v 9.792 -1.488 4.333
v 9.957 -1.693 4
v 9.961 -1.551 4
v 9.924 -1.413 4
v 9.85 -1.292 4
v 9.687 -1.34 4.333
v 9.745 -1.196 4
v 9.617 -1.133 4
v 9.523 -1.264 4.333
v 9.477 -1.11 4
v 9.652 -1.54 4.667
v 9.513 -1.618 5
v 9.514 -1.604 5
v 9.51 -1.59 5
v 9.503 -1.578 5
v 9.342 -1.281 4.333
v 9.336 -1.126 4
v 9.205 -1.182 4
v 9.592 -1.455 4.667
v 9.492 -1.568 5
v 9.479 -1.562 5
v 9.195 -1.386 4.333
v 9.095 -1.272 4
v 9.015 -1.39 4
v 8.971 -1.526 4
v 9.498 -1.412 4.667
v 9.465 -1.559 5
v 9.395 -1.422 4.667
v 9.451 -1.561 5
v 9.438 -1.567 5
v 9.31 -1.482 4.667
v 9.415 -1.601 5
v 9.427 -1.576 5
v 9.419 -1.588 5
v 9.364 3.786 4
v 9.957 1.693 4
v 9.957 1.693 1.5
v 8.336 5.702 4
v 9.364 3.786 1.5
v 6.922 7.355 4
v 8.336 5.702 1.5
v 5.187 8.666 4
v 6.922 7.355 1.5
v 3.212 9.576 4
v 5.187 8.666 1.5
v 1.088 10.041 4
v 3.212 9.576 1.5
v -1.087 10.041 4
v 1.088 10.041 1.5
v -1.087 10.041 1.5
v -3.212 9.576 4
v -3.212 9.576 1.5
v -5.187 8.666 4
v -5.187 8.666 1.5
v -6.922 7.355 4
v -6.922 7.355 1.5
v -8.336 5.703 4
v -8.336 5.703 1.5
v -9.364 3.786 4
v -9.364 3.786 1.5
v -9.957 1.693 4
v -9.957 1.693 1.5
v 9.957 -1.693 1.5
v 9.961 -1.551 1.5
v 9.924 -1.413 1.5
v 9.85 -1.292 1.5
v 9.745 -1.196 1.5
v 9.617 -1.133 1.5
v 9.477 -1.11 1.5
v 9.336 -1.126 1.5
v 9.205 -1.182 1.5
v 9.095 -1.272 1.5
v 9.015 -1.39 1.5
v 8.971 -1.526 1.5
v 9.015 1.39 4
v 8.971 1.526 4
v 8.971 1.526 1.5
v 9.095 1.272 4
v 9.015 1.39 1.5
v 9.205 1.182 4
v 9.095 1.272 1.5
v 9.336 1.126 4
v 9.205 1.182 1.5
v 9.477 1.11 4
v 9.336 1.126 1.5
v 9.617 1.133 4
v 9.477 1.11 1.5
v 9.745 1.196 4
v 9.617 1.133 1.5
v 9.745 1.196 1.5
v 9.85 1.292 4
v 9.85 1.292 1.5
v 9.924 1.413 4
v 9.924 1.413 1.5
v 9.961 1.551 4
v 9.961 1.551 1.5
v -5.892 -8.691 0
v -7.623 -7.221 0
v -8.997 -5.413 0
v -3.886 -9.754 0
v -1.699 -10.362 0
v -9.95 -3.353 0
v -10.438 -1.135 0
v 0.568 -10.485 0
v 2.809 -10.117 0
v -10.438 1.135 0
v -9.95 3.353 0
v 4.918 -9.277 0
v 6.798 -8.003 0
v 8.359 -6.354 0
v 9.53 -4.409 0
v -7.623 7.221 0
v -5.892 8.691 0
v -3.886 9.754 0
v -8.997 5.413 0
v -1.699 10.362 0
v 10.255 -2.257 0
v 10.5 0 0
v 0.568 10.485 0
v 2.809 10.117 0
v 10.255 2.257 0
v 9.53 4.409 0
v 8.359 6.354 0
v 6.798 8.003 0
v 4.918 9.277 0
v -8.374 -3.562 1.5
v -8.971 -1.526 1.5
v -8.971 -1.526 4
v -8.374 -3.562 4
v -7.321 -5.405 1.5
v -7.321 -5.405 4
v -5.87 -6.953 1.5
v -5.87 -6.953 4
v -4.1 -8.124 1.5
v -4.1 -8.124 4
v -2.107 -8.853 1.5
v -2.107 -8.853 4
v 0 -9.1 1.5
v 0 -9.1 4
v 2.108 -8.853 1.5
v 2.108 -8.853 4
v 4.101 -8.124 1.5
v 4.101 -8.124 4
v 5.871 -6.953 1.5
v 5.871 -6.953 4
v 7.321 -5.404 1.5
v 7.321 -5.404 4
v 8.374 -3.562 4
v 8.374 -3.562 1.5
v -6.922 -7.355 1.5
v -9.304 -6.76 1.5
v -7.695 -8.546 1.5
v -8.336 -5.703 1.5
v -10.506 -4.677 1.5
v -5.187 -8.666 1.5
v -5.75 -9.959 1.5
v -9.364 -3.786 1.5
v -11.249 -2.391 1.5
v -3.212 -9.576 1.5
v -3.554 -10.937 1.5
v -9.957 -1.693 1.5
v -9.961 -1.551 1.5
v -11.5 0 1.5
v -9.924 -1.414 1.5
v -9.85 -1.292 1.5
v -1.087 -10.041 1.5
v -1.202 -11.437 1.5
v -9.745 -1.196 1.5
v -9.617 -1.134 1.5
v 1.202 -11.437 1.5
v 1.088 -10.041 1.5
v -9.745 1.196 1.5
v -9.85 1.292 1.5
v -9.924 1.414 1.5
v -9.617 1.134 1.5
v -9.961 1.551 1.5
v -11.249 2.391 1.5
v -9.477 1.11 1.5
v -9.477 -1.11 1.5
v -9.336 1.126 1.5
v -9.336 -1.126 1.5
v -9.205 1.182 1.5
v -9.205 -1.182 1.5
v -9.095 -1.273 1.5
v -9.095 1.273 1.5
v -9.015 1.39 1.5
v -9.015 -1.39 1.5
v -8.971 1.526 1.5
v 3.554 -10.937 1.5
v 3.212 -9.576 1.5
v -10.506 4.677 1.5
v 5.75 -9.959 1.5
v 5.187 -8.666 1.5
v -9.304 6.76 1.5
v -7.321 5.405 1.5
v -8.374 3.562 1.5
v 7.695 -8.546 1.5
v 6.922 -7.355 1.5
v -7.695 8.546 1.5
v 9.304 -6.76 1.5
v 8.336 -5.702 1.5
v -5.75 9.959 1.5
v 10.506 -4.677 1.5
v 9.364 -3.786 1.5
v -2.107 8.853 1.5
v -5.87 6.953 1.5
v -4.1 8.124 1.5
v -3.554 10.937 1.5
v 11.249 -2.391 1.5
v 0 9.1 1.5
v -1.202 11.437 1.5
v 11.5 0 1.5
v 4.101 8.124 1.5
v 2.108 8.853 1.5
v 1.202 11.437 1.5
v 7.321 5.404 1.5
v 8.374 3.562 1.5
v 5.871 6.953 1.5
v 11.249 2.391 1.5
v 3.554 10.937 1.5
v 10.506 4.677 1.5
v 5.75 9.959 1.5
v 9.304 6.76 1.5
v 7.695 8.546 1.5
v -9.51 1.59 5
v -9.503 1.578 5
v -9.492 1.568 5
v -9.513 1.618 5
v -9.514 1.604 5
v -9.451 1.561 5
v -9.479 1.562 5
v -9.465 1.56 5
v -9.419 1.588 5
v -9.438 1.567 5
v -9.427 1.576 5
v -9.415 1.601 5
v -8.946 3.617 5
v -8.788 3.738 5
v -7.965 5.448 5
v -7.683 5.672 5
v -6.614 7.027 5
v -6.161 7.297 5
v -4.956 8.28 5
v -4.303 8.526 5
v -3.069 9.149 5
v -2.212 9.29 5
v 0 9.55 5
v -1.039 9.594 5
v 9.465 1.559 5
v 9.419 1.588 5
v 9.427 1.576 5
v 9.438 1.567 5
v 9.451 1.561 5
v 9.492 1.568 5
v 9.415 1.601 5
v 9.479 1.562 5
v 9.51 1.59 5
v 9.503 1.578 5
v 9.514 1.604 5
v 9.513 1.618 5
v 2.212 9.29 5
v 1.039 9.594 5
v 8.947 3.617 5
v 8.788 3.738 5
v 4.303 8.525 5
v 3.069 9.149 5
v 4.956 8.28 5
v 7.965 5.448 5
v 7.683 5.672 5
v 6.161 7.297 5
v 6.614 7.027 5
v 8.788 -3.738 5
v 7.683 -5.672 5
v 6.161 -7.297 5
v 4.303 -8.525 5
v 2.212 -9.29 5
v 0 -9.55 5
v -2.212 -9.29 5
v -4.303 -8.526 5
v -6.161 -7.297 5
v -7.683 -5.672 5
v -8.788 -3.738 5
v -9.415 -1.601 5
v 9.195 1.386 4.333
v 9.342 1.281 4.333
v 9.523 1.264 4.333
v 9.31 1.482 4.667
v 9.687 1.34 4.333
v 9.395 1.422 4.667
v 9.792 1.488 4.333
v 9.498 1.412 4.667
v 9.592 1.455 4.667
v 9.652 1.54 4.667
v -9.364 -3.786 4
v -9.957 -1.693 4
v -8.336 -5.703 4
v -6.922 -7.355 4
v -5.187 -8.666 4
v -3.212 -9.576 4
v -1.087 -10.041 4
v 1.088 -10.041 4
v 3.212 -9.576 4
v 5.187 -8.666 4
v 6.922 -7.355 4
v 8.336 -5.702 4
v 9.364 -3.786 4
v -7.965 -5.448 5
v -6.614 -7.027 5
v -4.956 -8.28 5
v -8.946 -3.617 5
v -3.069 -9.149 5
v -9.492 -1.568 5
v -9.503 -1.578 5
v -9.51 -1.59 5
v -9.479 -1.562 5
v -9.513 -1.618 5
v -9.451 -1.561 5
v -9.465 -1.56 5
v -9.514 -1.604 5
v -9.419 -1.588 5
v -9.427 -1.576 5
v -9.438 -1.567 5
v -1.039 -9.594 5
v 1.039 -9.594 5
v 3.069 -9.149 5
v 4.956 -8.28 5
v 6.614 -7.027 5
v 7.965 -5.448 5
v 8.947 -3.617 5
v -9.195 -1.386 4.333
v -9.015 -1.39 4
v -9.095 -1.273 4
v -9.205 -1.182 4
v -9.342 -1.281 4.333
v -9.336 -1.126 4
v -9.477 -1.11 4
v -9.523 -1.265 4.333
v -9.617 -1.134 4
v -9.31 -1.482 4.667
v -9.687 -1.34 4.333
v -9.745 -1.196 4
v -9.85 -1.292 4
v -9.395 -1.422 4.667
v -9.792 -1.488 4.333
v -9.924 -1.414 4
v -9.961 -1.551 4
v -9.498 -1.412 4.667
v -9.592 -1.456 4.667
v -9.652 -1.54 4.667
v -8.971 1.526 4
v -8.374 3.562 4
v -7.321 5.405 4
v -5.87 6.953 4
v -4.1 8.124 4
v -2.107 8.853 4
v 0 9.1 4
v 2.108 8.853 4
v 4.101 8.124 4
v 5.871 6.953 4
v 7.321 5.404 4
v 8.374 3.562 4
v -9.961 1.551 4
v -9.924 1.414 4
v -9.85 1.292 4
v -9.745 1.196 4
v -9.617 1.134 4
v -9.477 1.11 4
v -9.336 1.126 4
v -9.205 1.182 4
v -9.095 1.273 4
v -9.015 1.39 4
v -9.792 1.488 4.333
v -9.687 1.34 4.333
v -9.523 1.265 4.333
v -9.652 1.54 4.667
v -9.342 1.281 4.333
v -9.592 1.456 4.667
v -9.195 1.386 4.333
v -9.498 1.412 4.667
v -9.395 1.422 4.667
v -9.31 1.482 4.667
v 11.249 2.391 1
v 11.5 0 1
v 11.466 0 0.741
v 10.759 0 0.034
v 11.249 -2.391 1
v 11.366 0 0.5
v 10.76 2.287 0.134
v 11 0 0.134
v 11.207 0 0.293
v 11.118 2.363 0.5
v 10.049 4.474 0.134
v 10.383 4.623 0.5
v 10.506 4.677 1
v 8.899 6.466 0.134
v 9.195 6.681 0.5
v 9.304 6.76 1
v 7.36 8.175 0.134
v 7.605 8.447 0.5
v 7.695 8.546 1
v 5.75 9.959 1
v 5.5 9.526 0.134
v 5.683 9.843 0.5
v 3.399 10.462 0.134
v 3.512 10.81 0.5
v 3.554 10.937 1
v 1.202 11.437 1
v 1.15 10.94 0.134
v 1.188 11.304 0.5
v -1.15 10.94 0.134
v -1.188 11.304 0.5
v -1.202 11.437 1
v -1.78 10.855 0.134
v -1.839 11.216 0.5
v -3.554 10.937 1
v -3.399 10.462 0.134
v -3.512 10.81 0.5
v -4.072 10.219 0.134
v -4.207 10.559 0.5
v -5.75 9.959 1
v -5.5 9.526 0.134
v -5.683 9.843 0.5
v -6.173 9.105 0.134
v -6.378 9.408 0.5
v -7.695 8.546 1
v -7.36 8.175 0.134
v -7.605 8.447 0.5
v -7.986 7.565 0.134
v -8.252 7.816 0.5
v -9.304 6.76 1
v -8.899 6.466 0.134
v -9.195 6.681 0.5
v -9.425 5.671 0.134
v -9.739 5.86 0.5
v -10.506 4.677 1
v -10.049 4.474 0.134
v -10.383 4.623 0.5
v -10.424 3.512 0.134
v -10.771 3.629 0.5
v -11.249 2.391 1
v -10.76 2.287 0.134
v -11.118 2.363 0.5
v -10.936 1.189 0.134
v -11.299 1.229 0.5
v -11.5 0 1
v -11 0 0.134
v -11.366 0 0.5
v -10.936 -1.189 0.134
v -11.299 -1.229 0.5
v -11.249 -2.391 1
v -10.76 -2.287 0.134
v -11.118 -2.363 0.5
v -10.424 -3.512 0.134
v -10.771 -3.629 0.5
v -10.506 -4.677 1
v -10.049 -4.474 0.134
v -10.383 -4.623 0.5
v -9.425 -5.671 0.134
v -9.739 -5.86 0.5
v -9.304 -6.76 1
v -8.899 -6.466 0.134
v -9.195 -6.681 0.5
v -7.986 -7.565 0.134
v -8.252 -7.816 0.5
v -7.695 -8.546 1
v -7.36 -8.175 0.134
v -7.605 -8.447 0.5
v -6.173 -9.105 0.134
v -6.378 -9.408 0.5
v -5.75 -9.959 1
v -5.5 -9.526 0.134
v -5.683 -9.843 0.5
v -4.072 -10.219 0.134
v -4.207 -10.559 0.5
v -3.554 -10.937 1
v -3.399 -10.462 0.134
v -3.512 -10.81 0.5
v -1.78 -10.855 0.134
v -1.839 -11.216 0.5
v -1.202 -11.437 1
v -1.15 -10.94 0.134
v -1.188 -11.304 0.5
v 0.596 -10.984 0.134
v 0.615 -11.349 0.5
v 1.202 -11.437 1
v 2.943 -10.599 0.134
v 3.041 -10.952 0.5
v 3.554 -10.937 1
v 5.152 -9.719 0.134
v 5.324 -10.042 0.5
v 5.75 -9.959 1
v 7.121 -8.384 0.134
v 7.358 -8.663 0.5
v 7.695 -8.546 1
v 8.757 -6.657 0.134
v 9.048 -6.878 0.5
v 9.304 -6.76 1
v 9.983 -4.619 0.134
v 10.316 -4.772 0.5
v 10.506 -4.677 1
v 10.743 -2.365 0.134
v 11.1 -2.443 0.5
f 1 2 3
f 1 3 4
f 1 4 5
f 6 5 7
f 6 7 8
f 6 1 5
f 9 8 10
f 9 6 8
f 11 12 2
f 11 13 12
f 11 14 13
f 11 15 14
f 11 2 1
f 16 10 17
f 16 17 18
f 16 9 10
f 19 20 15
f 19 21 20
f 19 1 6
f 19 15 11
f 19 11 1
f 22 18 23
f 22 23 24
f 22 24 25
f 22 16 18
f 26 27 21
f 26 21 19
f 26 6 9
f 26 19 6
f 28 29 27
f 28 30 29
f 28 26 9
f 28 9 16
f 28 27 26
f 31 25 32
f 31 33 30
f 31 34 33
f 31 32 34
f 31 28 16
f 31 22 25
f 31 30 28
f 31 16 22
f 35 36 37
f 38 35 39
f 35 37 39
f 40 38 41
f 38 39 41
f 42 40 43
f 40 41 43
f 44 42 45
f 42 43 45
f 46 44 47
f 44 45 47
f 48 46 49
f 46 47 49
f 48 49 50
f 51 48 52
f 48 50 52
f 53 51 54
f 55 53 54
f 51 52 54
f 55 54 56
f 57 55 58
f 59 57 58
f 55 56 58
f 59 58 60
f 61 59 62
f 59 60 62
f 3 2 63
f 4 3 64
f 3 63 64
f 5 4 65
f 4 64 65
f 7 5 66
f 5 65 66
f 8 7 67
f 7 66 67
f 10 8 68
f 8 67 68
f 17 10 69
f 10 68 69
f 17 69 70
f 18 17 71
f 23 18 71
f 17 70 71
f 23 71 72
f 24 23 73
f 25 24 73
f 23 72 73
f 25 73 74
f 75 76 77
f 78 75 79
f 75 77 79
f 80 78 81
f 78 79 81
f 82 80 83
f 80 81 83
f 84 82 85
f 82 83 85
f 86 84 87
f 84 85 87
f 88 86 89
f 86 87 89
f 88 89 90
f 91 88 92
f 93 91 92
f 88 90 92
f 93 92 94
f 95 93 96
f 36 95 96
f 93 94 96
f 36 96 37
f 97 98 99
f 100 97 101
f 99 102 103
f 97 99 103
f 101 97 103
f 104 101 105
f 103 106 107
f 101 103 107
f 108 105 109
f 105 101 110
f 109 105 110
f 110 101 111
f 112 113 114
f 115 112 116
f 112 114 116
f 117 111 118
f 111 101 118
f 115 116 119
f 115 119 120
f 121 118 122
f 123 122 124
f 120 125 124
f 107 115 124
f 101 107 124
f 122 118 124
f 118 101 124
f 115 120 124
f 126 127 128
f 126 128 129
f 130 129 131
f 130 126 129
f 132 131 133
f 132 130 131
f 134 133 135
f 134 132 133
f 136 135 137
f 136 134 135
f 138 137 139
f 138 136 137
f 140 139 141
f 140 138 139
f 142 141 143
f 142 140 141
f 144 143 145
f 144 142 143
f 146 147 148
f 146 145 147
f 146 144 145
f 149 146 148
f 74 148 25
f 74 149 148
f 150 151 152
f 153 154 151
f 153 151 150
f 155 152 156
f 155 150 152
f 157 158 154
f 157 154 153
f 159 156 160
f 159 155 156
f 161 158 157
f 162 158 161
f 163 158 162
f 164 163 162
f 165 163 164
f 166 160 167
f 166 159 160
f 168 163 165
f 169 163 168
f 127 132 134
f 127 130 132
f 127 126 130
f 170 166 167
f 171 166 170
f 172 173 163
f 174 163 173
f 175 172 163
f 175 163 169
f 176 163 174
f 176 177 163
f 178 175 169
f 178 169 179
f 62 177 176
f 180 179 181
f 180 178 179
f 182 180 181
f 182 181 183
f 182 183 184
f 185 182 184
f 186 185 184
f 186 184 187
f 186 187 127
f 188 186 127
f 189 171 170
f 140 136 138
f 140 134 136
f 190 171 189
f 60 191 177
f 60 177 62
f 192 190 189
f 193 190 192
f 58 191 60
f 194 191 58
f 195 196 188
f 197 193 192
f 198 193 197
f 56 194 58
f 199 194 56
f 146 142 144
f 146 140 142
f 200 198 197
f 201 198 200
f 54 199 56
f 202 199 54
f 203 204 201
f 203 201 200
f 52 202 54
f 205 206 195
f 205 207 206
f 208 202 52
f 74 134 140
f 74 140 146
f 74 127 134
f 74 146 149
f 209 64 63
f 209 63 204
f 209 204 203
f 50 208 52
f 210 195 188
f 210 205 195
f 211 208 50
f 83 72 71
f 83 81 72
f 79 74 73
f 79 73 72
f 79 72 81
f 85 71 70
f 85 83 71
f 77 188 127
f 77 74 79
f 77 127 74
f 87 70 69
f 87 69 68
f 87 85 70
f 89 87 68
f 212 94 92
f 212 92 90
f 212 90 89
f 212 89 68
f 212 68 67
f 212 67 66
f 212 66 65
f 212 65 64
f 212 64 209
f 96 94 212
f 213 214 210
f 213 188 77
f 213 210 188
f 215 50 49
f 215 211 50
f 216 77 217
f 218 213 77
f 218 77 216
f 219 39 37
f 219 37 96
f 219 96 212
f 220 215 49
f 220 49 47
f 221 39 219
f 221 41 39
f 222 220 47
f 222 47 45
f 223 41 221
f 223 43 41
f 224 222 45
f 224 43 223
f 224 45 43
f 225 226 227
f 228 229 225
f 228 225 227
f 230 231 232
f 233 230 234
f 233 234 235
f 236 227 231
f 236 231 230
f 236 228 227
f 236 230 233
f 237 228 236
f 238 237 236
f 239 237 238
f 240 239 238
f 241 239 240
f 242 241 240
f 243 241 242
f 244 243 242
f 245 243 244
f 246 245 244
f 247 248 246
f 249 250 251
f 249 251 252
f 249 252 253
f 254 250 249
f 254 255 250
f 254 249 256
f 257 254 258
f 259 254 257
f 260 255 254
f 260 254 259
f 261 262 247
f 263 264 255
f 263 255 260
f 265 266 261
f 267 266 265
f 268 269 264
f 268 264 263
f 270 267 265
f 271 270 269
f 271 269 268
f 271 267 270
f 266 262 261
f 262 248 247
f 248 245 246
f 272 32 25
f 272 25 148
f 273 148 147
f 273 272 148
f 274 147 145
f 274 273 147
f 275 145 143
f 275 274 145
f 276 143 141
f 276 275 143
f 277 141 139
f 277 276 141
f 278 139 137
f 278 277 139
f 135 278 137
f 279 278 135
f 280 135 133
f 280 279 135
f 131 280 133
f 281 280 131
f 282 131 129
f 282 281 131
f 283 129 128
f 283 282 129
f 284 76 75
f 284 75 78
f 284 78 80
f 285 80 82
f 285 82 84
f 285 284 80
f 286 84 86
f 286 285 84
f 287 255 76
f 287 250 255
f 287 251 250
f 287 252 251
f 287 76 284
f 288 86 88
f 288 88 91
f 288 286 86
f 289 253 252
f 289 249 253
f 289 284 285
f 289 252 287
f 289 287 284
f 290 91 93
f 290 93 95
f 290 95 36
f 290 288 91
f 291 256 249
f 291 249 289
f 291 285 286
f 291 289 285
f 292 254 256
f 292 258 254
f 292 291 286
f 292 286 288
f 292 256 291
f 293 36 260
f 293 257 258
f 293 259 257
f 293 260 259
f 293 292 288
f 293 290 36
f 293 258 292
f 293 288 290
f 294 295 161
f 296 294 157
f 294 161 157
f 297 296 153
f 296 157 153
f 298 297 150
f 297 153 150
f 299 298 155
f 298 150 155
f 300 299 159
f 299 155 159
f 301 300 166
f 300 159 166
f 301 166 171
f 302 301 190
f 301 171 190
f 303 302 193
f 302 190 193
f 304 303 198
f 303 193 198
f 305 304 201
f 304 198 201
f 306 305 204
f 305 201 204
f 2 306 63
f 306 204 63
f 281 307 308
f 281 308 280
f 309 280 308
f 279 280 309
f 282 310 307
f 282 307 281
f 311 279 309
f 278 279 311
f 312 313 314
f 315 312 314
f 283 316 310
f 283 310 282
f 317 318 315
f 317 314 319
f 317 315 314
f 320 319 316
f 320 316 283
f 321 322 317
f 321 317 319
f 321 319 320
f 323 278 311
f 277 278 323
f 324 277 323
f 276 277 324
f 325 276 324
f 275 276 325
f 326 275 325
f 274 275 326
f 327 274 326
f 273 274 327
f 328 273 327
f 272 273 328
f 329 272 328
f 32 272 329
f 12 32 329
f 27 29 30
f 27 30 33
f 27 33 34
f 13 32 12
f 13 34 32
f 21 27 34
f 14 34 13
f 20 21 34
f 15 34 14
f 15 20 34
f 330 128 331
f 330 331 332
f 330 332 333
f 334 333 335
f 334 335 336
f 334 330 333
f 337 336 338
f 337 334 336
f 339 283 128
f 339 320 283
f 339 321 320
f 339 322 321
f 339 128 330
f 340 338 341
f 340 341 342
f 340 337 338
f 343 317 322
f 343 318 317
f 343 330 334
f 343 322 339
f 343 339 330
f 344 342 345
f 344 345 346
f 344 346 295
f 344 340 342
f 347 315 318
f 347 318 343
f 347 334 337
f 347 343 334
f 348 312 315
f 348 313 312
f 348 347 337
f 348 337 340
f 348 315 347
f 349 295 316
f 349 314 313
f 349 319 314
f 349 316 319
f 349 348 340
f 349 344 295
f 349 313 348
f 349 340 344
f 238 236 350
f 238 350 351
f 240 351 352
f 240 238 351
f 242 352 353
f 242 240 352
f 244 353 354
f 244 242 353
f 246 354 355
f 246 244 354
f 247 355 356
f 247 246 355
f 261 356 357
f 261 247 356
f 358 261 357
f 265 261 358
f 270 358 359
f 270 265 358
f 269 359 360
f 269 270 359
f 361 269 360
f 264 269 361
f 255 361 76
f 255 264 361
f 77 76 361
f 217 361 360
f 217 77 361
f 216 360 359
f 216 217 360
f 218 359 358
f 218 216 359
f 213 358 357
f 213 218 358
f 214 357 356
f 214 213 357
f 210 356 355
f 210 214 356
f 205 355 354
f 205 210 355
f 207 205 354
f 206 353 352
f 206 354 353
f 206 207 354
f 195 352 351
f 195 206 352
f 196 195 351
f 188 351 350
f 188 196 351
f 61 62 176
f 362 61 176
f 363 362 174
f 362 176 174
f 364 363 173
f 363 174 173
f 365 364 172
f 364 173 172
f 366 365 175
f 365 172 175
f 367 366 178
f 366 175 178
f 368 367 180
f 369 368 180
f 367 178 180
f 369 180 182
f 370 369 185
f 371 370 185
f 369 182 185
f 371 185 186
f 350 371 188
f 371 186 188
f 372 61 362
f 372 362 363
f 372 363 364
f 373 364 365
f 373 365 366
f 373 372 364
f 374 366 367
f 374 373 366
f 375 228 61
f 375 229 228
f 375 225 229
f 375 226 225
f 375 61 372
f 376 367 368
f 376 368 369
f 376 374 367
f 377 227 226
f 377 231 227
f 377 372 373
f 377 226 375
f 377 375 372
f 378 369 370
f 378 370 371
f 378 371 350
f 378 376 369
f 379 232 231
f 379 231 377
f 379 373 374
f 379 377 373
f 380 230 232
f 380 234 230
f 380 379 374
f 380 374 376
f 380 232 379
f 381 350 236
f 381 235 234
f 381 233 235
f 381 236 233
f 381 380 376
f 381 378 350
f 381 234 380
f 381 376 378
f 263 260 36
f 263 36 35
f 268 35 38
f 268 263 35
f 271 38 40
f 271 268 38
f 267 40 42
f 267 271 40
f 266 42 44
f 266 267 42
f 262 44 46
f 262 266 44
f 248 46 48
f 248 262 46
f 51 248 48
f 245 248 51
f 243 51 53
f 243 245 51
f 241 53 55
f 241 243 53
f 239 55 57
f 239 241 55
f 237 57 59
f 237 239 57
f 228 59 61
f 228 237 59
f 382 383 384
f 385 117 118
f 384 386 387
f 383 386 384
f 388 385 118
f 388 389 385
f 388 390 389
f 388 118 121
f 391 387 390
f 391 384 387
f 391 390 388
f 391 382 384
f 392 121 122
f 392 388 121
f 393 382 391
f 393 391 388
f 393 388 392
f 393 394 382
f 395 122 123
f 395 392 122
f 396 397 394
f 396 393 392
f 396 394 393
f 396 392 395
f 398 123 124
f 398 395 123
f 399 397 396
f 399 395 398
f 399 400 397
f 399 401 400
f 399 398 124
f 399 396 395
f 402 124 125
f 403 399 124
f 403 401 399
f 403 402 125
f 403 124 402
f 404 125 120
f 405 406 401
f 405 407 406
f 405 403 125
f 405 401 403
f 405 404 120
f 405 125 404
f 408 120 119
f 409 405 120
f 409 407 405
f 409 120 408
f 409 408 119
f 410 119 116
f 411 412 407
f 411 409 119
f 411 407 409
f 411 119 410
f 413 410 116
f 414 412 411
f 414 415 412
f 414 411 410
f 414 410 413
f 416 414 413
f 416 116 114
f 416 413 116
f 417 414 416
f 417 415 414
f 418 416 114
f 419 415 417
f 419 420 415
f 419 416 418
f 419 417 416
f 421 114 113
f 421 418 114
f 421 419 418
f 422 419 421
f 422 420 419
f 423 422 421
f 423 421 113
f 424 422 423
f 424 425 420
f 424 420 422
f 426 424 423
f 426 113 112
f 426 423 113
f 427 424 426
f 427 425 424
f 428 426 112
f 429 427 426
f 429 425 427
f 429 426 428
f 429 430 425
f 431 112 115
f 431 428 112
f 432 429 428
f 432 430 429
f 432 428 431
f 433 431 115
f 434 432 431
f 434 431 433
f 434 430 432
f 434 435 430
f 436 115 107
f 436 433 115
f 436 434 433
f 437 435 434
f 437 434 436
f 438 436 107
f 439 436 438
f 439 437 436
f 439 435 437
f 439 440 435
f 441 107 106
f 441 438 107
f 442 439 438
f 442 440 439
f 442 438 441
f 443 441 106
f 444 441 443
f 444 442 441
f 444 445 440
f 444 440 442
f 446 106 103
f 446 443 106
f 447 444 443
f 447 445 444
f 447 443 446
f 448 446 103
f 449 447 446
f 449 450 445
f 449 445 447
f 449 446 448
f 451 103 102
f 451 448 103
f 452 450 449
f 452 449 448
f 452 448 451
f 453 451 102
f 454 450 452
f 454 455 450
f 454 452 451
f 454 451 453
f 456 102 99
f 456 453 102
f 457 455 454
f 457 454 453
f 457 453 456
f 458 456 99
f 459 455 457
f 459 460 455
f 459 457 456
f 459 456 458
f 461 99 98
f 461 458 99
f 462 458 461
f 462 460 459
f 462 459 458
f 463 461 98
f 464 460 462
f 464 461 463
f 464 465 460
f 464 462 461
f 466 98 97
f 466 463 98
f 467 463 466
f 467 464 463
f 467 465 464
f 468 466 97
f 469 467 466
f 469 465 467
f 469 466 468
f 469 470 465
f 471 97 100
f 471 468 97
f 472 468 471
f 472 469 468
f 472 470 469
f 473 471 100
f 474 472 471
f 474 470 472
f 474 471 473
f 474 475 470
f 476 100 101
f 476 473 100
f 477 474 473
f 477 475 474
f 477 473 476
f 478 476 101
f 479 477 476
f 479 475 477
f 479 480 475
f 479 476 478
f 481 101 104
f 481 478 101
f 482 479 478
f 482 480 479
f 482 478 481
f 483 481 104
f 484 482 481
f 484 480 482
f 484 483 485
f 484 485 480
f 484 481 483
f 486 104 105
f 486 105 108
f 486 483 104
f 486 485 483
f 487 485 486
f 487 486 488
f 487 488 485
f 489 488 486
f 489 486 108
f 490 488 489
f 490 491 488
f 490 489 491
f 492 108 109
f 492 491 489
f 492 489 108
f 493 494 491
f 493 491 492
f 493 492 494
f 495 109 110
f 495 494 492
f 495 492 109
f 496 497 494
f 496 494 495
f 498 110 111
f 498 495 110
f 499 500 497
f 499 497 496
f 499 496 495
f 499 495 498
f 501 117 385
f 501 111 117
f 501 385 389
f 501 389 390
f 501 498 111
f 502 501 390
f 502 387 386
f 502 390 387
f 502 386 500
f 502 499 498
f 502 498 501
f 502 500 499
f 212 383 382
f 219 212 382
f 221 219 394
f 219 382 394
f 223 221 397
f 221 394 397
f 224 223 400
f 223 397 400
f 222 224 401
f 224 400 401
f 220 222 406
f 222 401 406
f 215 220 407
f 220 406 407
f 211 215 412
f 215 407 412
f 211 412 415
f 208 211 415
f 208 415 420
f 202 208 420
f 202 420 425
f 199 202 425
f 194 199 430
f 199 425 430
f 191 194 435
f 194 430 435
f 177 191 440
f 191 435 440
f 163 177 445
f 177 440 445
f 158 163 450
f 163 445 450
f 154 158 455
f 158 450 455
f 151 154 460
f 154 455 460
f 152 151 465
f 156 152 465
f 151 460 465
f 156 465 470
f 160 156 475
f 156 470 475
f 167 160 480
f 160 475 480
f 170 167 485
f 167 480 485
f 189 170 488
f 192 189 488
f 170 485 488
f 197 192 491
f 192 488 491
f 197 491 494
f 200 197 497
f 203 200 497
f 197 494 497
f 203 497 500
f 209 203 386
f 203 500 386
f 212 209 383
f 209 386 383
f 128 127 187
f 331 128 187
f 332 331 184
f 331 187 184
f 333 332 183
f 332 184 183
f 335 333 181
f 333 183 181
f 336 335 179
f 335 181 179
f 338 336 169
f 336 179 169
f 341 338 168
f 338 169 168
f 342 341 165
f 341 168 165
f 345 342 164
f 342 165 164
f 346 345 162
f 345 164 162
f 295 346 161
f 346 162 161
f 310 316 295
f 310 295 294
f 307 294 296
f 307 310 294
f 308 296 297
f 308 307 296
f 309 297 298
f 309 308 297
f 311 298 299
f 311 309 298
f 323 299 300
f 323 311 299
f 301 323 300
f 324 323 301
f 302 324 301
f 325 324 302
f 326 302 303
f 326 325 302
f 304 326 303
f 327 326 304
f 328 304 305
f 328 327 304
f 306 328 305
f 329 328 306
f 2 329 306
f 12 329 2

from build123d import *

# Parameters (mm, degrees)
SKETCH_R        = 11.5
PAD_DEPTH       = 1.5
PAD001_DEPTH    = 5
FILLET_R        = 1
CHAMFER_1_SIZE2 = 0.45
CHAMFER_1_SIZE  = 1
CHAMFER_2_SIZE2 = 0.45
CHAMFER_2_SIZE  = 1


with BuildPart() as part:
    # Sketch → Pad (new body)
    with BuildSketch(Plane.XY):
        Circle(SKETCH_R)
    extrude(amount=PAD_DEPTH)

    # Sketch001 (on XY_Plane of Origin) → Pad001 (join)
    with BuildSketch(Plane.XY):
        with BuildLine():
            ThreePointArc((9.957052, 1.693258), (0.000108, 10.1), (-9.957015, 1.693471))
            ThreePointArc((-9.957015, 1.693471), (-9.547929, 1.116714), (-8.971172, 1.5258))
            ThreePointArc((8.971205, 1.525609), (9.7e-05, 9.1), (-8.971172, 1.5258))
            ThreePointArc((8.971205, 1.525609), (9.547953, 1.11651), (9.957052, 1.693258))
        make_face()
        with BuildLine():
            ThreePointArc((-9.957015, -1.693471), (0.000108, -10.1), (9.957052, -1.693258))
            ThreePointArc((9.957052, -1.693258), (9.547953, -1.11651), (8.971205, -1.525609))
            ThreePointArc((-8.971172, -1.5258), (9.7e-05, -9.1), (8.971205, -1.525609))
            ThreePointArc((-8.971172, -1.5258), (-9.547929, -1.116714), (-9.957015, -1.693471))
        make_face()
    extrude(amount=PAD001_DEPTH)

    # Fillet
    fillet_edges = [part.edges().sort_by_distance(p)[0] for p in [
        (-11.5, 0, 0),
    ]]
    fillet(fillet_edges, radius=FILLET_R)

    # Chamfer 1
    chamfer_1_edges = [part.edges().sort_by_distance(p)[0] for p in [
        (0.000108, 10.1, 5),
    ]]
    chamfer_1_side = part.faces().sort_by_distance((0.000108, 10.1, 3.25))[0]
    chamfer(chamfer_1_edges, length=CHAMFER_1_SIZE, length2=CHAMFER_1_SIZE2, reference=chamfer_1_side)

    # Chamfer 2
    chamfer_2_edges = [part.edges().sort_by_distance(p)[0] for p in [
        (0.000108, -10.1, 5),
    ]]
    chamfer_2_side = part.faces().sort_by_distance((0.000108, -10.1, 3.25))[0]
    chamfer(chamfer_2_edges, length=CHAMFER_2_SIZE, length2=CHAMFER_2_SIZE2, reference=chamfer_2_side)


solid = part.part
